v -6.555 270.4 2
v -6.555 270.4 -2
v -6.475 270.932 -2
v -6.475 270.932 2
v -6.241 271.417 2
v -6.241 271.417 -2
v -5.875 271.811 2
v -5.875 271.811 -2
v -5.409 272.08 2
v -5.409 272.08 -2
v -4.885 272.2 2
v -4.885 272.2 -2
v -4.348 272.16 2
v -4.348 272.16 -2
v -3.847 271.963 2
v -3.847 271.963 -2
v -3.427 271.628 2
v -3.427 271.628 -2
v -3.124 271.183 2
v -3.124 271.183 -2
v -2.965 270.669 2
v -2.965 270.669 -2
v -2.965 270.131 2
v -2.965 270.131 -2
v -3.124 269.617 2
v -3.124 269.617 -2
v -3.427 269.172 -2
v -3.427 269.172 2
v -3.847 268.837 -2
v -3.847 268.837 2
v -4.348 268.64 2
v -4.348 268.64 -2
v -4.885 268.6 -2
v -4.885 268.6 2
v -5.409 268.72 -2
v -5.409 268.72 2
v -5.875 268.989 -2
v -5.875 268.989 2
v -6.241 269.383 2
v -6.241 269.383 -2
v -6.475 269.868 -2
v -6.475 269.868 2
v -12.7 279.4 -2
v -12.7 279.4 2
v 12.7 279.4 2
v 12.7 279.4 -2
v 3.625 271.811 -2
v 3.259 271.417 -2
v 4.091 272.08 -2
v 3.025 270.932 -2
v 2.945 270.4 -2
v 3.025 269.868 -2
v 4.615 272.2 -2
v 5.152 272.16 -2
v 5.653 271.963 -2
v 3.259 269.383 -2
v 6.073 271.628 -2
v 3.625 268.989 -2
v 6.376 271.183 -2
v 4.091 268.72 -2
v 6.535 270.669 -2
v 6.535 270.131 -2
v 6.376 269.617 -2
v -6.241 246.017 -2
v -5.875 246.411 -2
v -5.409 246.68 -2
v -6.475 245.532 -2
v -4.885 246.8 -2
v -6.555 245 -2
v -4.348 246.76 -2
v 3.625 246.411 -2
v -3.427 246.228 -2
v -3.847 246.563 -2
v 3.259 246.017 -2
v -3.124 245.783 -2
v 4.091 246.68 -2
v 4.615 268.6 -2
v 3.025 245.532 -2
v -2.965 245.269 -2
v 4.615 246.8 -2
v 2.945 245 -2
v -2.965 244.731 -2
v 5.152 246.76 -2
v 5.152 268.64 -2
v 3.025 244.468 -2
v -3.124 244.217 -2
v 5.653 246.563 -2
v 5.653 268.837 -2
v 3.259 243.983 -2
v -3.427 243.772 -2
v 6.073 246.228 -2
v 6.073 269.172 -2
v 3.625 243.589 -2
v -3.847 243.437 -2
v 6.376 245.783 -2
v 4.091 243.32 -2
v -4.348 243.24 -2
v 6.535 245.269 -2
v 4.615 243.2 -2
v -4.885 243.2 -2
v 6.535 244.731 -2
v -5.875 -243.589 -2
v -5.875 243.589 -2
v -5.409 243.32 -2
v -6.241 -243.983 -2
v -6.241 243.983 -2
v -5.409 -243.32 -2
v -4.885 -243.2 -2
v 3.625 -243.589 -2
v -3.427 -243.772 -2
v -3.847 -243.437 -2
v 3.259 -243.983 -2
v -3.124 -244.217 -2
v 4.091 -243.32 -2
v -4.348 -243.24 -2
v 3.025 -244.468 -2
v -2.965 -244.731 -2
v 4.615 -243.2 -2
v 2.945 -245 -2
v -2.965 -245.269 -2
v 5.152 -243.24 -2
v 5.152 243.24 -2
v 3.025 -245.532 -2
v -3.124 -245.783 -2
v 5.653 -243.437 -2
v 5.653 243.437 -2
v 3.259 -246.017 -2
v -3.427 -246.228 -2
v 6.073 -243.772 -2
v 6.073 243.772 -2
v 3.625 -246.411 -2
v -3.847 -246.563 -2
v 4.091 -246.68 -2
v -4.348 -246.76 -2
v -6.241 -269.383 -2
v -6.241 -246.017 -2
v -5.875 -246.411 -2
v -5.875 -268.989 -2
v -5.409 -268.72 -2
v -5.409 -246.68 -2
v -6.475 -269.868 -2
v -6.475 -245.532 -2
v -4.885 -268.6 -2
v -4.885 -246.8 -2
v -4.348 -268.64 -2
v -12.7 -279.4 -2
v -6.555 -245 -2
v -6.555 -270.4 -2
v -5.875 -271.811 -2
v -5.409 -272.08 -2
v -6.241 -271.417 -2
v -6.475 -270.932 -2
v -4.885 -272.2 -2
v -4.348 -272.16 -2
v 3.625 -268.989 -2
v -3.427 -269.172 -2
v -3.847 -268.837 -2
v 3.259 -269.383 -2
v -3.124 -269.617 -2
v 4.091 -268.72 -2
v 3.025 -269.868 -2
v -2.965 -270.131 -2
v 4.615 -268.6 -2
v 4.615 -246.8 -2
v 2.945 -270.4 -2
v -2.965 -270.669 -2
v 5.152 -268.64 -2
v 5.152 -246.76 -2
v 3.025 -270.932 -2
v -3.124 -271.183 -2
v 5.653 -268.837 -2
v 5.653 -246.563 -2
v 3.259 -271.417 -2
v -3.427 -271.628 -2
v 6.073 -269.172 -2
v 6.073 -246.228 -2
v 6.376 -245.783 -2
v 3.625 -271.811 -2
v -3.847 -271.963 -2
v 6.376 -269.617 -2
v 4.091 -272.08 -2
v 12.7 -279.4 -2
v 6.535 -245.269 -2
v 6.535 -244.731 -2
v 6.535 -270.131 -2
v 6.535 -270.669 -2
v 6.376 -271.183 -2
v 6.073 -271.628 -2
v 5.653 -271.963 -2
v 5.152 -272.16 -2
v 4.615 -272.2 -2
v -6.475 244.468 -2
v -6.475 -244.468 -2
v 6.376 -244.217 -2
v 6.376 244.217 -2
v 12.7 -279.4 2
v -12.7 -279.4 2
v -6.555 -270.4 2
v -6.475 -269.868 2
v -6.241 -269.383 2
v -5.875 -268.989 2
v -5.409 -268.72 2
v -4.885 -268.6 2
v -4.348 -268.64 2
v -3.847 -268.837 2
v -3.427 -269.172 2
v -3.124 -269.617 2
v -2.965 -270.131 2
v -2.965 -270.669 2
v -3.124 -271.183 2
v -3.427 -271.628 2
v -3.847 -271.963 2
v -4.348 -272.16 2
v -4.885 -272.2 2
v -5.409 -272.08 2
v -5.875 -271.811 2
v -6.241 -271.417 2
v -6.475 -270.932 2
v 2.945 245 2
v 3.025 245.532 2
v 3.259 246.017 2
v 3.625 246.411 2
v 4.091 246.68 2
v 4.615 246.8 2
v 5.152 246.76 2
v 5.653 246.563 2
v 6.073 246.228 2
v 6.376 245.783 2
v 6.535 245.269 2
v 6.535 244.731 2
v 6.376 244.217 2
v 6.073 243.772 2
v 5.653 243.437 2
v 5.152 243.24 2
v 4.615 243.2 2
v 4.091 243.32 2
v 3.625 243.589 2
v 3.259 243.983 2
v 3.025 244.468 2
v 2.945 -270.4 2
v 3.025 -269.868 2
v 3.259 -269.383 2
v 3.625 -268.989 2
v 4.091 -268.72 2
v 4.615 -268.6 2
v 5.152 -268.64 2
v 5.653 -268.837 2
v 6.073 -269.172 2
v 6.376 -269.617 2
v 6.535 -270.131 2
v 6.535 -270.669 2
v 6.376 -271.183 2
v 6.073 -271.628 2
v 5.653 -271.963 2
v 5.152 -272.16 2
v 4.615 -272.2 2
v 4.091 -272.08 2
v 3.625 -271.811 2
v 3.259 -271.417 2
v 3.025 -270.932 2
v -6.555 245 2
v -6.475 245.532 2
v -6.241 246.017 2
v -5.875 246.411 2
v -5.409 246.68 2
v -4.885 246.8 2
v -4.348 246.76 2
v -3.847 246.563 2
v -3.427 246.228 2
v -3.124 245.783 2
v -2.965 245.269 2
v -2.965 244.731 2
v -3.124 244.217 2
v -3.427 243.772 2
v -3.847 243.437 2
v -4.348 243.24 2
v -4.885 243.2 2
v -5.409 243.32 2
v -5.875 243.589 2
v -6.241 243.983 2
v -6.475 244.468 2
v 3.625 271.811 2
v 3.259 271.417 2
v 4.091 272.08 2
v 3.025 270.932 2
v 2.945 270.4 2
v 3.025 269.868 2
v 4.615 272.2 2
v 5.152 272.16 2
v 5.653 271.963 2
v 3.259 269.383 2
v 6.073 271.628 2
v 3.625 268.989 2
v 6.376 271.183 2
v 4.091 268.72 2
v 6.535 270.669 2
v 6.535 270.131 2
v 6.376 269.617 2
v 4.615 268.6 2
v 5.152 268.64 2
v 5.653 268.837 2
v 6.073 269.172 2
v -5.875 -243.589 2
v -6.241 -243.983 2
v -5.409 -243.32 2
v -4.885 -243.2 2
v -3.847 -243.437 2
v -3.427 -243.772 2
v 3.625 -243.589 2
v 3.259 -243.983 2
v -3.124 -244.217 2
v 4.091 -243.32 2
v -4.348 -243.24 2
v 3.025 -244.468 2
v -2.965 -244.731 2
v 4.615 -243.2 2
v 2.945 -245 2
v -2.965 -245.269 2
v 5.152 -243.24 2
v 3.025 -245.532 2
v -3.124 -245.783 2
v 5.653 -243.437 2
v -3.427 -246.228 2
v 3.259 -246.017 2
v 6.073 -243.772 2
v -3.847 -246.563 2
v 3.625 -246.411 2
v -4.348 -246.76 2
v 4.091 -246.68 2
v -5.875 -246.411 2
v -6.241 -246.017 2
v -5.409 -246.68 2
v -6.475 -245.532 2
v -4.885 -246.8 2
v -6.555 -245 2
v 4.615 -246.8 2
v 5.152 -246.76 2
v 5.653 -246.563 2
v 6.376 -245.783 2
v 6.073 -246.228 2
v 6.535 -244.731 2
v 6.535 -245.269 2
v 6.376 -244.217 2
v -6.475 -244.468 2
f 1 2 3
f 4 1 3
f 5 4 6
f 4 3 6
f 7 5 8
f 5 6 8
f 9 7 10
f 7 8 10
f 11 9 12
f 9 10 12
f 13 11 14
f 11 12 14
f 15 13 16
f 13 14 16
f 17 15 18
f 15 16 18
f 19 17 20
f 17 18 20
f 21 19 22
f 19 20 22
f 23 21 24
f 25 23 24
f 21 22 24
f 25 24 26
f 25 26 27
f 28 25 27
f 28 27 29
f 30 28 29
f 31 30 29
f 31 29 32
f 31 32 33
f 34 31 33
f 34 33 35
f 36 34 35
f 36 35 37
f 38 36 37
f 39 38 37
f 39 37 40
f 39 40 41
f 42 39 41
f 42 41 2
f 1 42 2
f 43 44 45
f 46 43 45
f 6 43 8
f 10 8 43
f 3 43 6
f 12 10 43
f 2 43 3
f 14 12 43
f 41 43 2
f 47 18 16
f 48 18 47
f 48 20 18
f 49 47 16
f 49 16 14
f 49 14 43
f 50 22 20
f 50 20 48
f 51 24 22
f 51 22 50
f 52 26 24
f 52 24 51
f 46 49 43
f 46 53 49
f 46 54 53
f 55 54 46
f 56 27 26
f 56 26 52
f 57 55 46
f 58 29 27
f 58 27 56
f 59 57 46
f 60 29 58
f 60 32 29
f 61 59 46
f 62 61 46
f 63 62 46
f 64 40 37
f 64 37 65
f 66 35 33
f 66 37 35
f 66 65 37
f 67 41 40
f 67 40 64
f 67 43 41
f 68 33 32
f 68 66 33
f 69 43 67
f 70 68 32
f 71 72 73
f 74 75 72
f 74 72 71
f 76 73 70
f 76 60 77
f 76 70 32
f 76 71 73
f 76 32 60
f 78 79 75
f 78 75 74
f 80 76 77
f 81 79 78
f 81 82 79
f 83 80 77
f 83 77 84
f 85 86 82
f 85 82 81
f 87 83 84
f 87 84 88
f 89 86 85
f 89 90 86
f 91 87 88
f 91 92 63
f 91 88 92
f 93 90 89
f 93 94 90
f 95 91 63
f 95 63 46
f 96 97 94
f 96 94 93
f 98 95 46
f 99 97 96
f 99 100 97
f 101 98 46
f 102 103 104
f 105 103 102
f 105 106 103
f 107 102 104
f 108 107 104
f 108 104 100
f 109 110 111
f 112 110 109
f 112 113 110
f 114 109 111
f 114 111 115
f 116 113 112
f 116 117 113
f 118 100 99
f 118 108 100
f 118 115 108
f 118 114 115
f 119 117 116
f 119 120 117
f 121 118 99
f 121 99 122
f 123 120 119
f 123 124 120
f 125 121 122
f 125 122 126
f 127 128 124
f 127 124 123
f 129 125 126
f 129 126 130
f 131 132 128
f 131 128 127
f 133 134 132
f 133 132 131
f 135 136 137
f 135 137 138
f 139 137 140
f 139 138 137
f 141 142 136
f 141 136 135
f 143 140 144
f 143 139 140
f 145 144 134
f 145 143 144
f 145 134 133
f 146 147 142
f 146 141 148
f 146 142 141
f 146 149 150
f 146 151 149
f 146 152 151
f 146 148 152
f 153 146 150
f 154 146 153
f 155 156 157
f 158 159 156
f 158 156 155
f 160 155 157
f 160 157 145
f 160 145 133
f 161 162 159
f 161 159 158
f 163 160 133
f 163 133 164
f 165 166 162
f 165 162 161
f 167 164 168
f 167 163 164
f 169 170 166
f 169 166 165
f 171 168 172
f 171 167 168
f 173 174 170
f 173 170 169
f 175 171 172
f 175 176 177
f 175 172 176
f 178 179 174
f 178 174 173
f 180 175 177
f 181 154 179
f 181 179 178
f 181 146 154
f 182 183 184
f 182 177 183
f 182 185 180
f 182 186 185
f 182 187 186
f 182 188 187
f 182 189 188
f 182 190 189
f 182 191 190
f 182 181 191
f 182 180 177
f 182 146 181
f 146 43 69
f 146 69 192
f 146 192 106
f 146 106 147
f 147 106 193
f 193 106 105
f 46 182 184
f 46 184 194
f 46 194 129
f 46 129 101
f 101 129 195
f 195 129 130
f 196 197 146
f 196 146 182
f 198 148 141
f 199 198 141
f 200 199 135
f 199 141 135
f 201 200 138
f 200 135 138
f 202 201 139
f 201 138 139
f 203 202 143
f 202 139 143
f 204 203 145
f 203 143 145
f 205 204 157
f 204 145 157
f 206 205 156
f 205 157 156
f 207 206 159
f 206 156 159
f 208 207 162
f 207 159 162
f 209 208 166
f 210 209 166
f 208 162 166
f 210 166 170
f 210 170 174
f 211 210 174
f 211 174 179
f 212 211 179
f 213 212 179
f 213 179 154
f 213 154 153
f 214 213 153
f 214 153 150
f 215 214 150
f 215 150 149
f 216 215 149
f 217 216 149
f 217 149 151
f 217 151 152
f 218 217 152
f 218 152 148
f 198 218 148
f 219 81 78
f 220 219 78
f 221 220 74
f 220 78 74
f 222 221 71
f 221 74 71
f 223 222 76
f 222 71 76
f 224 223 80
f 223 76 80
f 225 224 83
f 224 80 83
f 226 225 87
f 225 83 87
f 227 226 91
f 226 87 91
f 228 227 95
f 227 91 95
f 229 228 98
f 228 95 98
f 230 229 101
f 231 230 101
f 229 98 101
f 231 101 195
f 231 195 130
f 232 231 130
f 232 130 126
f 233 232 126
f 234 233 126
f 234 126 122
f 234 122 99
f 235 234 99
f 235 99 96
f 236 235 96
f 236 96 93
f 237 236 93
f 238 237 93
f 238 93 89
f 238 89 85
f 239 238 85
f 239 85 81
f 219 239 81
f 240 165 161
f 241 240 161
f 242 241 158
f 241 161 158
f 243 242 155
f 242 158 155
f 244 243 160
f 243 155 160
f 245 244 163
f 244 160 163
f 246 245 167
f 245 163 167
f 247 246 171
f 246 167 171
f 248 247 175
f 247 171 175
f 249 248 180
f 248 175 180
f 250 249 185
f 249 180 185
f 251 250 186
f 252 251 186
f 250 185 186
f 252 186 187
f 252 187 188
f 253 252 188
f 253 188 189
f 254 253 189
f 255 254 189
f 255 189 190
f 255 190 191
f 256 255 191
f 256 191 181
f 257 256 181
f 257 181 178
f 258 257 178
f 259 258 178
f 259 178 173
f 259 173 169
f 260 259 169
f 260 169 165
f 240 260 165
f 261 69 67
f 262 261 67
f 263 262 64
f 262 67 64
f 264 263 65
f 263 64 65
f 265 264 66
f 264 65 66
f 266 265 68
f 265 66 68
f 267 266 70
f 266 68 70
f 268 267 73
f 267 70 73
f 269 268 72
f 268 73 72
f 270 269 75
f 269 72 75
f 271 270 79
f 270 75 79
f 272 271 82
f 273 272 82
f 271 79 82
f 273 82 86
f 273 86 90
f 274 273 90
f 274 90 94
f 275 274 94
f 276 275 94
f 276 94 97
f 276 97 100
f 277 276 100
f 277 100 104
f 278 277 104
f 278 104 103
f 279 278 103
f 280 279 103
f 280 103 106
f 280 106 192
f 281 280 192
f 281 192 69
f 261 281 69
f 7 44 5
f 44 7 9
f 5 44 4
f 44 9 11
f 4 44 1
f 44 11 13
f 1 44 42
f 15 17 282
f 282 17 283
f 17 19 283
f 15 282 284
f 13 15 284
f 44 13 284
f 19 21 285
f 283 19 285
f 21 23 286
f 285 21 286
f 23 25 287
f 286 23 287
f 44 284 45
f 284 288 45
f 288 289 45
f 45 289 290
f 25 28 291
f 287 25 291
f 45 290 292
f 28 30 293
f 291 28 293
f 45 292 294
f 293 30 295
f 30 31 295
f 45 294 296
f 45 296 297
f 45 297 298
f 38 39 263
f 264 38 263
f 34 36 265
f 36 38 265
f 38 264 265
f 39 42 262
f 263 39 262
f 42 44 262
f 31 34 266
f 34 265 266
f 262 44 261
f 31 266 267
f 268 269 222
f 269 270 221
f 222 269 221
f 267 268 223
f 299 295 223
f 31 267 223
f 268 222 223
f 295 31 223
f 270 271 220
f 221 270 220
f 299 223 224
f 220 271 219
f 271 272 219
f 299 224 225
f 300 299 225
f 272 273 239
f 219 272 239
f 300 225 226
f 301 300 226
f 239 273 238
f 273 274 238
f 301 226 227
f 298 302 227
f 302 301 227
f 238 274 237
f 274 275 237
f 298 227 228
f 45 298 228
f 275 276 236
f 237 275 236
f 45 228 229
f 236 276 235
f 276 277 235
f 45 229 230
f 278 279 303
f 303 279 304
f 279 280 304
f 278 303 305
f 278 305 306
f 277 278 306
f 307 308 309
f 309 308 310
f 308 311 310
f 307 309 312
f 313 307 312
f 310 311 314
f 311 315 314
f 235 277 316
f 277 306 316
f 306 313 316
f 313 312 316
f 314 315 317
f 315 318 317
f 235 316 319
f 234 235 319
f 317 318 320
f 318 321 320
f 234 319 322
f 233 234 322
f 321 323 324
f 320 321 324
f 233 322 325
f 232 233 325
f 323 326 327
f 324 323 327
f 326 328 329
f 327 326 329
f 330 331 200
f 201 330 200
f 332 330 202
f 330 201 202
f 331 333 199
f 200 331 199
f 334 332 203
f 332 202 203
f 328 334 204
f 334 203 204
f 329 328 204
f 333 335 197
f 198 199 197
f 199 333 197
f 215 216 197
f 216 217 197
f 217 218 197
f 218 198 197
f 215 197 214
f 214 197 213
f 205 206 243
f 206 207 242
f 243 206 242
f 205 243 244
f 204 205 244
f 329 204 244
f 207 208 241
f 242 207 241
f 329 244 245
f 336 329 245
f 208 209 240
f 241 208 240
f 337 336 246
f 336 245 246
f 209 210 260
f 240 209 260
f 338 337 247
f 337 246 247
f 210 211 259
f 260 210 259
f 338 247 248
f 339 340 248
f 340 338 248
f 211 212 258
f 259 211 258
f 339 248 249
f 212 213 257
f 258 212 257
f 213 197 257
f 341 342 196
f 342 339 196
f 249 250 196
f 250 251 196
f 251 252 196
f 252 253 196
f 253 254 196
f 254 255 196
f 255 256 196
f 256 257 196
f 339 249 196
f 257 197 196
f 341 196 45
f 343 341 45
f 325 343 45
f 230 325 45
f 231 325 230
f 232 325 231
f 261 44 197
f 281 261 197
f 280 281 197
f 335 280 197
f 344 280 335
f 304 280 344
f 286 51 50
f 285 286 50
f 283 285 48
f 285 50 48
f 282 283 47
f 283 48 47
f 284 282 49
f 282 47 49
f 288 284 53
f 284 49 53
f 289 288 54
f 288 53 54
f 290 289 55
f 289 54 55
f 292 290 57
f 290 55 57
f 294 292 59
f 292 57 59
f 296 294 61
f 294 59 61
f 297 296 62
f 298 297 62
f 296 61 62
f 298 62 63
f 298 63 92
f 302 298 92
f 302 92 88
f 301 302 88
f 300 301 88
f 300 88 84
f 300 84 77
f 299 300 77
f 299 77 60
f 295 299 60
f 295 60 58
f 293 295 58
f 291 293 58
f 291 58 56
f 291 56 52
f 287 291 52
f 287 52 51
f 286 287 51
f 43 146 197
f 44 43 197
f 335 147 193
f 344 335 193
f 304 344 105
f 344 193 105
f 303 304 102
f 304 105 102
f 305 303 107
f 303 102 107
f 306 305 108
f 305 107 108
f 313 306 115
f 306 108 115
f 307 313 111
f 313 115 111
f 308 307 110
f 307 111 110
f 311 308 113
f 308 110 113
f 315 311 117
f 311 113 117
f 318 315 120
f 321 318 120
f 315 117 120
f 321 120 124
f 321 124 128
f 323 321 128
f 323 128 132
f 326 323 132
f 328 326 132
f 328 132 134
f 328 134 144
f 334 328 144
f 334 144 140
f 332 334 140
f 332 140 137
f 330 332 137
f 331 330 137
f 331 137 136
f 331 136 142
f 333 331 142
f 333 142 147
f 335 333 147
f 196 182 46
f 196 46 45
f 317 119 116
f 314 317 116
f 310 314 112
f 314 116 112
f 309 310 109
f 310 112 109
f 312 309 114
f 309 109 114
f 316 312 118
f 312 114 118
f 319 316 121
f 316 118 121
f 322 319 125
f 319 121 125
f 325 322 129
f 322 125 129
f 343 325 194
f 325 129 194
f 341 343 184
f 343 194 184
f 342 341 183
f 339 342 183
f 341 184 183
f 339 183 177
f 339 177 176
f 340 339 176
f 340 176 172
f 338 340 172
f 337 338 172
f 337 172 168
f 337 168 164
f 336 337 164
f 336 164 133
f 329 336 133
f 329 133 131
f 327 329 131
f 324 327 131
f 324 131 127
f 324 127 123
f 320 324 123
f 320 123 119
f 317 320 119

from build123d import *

# Parameters (mm, degrees)
F0_W     = 25.4
F0_H     = 4
F1_DEPTH = 279.4
F3_D     = 3.61


with BuildPart() as f1:
    # F0 (on Front) → F1 (new body, symmetric)
    with BuildSketch(Plane.XZ):
        Rectangle(F0_W, F0_H)
    extrude(amount=F1_DEPTH, both=True)

    # F3 (through all)
    with Locations(Plane.XY.offset(2)):
        with Locations((-4.75, -270.4), (-4.75, -245), (4.75, -245), (4.75, -270.4), (-4.75, 245), (4.75, 245), (4.75, 270.4), (-4.75, 270.4)):
            Hole(F3_D / 2)


solid = f1.part
